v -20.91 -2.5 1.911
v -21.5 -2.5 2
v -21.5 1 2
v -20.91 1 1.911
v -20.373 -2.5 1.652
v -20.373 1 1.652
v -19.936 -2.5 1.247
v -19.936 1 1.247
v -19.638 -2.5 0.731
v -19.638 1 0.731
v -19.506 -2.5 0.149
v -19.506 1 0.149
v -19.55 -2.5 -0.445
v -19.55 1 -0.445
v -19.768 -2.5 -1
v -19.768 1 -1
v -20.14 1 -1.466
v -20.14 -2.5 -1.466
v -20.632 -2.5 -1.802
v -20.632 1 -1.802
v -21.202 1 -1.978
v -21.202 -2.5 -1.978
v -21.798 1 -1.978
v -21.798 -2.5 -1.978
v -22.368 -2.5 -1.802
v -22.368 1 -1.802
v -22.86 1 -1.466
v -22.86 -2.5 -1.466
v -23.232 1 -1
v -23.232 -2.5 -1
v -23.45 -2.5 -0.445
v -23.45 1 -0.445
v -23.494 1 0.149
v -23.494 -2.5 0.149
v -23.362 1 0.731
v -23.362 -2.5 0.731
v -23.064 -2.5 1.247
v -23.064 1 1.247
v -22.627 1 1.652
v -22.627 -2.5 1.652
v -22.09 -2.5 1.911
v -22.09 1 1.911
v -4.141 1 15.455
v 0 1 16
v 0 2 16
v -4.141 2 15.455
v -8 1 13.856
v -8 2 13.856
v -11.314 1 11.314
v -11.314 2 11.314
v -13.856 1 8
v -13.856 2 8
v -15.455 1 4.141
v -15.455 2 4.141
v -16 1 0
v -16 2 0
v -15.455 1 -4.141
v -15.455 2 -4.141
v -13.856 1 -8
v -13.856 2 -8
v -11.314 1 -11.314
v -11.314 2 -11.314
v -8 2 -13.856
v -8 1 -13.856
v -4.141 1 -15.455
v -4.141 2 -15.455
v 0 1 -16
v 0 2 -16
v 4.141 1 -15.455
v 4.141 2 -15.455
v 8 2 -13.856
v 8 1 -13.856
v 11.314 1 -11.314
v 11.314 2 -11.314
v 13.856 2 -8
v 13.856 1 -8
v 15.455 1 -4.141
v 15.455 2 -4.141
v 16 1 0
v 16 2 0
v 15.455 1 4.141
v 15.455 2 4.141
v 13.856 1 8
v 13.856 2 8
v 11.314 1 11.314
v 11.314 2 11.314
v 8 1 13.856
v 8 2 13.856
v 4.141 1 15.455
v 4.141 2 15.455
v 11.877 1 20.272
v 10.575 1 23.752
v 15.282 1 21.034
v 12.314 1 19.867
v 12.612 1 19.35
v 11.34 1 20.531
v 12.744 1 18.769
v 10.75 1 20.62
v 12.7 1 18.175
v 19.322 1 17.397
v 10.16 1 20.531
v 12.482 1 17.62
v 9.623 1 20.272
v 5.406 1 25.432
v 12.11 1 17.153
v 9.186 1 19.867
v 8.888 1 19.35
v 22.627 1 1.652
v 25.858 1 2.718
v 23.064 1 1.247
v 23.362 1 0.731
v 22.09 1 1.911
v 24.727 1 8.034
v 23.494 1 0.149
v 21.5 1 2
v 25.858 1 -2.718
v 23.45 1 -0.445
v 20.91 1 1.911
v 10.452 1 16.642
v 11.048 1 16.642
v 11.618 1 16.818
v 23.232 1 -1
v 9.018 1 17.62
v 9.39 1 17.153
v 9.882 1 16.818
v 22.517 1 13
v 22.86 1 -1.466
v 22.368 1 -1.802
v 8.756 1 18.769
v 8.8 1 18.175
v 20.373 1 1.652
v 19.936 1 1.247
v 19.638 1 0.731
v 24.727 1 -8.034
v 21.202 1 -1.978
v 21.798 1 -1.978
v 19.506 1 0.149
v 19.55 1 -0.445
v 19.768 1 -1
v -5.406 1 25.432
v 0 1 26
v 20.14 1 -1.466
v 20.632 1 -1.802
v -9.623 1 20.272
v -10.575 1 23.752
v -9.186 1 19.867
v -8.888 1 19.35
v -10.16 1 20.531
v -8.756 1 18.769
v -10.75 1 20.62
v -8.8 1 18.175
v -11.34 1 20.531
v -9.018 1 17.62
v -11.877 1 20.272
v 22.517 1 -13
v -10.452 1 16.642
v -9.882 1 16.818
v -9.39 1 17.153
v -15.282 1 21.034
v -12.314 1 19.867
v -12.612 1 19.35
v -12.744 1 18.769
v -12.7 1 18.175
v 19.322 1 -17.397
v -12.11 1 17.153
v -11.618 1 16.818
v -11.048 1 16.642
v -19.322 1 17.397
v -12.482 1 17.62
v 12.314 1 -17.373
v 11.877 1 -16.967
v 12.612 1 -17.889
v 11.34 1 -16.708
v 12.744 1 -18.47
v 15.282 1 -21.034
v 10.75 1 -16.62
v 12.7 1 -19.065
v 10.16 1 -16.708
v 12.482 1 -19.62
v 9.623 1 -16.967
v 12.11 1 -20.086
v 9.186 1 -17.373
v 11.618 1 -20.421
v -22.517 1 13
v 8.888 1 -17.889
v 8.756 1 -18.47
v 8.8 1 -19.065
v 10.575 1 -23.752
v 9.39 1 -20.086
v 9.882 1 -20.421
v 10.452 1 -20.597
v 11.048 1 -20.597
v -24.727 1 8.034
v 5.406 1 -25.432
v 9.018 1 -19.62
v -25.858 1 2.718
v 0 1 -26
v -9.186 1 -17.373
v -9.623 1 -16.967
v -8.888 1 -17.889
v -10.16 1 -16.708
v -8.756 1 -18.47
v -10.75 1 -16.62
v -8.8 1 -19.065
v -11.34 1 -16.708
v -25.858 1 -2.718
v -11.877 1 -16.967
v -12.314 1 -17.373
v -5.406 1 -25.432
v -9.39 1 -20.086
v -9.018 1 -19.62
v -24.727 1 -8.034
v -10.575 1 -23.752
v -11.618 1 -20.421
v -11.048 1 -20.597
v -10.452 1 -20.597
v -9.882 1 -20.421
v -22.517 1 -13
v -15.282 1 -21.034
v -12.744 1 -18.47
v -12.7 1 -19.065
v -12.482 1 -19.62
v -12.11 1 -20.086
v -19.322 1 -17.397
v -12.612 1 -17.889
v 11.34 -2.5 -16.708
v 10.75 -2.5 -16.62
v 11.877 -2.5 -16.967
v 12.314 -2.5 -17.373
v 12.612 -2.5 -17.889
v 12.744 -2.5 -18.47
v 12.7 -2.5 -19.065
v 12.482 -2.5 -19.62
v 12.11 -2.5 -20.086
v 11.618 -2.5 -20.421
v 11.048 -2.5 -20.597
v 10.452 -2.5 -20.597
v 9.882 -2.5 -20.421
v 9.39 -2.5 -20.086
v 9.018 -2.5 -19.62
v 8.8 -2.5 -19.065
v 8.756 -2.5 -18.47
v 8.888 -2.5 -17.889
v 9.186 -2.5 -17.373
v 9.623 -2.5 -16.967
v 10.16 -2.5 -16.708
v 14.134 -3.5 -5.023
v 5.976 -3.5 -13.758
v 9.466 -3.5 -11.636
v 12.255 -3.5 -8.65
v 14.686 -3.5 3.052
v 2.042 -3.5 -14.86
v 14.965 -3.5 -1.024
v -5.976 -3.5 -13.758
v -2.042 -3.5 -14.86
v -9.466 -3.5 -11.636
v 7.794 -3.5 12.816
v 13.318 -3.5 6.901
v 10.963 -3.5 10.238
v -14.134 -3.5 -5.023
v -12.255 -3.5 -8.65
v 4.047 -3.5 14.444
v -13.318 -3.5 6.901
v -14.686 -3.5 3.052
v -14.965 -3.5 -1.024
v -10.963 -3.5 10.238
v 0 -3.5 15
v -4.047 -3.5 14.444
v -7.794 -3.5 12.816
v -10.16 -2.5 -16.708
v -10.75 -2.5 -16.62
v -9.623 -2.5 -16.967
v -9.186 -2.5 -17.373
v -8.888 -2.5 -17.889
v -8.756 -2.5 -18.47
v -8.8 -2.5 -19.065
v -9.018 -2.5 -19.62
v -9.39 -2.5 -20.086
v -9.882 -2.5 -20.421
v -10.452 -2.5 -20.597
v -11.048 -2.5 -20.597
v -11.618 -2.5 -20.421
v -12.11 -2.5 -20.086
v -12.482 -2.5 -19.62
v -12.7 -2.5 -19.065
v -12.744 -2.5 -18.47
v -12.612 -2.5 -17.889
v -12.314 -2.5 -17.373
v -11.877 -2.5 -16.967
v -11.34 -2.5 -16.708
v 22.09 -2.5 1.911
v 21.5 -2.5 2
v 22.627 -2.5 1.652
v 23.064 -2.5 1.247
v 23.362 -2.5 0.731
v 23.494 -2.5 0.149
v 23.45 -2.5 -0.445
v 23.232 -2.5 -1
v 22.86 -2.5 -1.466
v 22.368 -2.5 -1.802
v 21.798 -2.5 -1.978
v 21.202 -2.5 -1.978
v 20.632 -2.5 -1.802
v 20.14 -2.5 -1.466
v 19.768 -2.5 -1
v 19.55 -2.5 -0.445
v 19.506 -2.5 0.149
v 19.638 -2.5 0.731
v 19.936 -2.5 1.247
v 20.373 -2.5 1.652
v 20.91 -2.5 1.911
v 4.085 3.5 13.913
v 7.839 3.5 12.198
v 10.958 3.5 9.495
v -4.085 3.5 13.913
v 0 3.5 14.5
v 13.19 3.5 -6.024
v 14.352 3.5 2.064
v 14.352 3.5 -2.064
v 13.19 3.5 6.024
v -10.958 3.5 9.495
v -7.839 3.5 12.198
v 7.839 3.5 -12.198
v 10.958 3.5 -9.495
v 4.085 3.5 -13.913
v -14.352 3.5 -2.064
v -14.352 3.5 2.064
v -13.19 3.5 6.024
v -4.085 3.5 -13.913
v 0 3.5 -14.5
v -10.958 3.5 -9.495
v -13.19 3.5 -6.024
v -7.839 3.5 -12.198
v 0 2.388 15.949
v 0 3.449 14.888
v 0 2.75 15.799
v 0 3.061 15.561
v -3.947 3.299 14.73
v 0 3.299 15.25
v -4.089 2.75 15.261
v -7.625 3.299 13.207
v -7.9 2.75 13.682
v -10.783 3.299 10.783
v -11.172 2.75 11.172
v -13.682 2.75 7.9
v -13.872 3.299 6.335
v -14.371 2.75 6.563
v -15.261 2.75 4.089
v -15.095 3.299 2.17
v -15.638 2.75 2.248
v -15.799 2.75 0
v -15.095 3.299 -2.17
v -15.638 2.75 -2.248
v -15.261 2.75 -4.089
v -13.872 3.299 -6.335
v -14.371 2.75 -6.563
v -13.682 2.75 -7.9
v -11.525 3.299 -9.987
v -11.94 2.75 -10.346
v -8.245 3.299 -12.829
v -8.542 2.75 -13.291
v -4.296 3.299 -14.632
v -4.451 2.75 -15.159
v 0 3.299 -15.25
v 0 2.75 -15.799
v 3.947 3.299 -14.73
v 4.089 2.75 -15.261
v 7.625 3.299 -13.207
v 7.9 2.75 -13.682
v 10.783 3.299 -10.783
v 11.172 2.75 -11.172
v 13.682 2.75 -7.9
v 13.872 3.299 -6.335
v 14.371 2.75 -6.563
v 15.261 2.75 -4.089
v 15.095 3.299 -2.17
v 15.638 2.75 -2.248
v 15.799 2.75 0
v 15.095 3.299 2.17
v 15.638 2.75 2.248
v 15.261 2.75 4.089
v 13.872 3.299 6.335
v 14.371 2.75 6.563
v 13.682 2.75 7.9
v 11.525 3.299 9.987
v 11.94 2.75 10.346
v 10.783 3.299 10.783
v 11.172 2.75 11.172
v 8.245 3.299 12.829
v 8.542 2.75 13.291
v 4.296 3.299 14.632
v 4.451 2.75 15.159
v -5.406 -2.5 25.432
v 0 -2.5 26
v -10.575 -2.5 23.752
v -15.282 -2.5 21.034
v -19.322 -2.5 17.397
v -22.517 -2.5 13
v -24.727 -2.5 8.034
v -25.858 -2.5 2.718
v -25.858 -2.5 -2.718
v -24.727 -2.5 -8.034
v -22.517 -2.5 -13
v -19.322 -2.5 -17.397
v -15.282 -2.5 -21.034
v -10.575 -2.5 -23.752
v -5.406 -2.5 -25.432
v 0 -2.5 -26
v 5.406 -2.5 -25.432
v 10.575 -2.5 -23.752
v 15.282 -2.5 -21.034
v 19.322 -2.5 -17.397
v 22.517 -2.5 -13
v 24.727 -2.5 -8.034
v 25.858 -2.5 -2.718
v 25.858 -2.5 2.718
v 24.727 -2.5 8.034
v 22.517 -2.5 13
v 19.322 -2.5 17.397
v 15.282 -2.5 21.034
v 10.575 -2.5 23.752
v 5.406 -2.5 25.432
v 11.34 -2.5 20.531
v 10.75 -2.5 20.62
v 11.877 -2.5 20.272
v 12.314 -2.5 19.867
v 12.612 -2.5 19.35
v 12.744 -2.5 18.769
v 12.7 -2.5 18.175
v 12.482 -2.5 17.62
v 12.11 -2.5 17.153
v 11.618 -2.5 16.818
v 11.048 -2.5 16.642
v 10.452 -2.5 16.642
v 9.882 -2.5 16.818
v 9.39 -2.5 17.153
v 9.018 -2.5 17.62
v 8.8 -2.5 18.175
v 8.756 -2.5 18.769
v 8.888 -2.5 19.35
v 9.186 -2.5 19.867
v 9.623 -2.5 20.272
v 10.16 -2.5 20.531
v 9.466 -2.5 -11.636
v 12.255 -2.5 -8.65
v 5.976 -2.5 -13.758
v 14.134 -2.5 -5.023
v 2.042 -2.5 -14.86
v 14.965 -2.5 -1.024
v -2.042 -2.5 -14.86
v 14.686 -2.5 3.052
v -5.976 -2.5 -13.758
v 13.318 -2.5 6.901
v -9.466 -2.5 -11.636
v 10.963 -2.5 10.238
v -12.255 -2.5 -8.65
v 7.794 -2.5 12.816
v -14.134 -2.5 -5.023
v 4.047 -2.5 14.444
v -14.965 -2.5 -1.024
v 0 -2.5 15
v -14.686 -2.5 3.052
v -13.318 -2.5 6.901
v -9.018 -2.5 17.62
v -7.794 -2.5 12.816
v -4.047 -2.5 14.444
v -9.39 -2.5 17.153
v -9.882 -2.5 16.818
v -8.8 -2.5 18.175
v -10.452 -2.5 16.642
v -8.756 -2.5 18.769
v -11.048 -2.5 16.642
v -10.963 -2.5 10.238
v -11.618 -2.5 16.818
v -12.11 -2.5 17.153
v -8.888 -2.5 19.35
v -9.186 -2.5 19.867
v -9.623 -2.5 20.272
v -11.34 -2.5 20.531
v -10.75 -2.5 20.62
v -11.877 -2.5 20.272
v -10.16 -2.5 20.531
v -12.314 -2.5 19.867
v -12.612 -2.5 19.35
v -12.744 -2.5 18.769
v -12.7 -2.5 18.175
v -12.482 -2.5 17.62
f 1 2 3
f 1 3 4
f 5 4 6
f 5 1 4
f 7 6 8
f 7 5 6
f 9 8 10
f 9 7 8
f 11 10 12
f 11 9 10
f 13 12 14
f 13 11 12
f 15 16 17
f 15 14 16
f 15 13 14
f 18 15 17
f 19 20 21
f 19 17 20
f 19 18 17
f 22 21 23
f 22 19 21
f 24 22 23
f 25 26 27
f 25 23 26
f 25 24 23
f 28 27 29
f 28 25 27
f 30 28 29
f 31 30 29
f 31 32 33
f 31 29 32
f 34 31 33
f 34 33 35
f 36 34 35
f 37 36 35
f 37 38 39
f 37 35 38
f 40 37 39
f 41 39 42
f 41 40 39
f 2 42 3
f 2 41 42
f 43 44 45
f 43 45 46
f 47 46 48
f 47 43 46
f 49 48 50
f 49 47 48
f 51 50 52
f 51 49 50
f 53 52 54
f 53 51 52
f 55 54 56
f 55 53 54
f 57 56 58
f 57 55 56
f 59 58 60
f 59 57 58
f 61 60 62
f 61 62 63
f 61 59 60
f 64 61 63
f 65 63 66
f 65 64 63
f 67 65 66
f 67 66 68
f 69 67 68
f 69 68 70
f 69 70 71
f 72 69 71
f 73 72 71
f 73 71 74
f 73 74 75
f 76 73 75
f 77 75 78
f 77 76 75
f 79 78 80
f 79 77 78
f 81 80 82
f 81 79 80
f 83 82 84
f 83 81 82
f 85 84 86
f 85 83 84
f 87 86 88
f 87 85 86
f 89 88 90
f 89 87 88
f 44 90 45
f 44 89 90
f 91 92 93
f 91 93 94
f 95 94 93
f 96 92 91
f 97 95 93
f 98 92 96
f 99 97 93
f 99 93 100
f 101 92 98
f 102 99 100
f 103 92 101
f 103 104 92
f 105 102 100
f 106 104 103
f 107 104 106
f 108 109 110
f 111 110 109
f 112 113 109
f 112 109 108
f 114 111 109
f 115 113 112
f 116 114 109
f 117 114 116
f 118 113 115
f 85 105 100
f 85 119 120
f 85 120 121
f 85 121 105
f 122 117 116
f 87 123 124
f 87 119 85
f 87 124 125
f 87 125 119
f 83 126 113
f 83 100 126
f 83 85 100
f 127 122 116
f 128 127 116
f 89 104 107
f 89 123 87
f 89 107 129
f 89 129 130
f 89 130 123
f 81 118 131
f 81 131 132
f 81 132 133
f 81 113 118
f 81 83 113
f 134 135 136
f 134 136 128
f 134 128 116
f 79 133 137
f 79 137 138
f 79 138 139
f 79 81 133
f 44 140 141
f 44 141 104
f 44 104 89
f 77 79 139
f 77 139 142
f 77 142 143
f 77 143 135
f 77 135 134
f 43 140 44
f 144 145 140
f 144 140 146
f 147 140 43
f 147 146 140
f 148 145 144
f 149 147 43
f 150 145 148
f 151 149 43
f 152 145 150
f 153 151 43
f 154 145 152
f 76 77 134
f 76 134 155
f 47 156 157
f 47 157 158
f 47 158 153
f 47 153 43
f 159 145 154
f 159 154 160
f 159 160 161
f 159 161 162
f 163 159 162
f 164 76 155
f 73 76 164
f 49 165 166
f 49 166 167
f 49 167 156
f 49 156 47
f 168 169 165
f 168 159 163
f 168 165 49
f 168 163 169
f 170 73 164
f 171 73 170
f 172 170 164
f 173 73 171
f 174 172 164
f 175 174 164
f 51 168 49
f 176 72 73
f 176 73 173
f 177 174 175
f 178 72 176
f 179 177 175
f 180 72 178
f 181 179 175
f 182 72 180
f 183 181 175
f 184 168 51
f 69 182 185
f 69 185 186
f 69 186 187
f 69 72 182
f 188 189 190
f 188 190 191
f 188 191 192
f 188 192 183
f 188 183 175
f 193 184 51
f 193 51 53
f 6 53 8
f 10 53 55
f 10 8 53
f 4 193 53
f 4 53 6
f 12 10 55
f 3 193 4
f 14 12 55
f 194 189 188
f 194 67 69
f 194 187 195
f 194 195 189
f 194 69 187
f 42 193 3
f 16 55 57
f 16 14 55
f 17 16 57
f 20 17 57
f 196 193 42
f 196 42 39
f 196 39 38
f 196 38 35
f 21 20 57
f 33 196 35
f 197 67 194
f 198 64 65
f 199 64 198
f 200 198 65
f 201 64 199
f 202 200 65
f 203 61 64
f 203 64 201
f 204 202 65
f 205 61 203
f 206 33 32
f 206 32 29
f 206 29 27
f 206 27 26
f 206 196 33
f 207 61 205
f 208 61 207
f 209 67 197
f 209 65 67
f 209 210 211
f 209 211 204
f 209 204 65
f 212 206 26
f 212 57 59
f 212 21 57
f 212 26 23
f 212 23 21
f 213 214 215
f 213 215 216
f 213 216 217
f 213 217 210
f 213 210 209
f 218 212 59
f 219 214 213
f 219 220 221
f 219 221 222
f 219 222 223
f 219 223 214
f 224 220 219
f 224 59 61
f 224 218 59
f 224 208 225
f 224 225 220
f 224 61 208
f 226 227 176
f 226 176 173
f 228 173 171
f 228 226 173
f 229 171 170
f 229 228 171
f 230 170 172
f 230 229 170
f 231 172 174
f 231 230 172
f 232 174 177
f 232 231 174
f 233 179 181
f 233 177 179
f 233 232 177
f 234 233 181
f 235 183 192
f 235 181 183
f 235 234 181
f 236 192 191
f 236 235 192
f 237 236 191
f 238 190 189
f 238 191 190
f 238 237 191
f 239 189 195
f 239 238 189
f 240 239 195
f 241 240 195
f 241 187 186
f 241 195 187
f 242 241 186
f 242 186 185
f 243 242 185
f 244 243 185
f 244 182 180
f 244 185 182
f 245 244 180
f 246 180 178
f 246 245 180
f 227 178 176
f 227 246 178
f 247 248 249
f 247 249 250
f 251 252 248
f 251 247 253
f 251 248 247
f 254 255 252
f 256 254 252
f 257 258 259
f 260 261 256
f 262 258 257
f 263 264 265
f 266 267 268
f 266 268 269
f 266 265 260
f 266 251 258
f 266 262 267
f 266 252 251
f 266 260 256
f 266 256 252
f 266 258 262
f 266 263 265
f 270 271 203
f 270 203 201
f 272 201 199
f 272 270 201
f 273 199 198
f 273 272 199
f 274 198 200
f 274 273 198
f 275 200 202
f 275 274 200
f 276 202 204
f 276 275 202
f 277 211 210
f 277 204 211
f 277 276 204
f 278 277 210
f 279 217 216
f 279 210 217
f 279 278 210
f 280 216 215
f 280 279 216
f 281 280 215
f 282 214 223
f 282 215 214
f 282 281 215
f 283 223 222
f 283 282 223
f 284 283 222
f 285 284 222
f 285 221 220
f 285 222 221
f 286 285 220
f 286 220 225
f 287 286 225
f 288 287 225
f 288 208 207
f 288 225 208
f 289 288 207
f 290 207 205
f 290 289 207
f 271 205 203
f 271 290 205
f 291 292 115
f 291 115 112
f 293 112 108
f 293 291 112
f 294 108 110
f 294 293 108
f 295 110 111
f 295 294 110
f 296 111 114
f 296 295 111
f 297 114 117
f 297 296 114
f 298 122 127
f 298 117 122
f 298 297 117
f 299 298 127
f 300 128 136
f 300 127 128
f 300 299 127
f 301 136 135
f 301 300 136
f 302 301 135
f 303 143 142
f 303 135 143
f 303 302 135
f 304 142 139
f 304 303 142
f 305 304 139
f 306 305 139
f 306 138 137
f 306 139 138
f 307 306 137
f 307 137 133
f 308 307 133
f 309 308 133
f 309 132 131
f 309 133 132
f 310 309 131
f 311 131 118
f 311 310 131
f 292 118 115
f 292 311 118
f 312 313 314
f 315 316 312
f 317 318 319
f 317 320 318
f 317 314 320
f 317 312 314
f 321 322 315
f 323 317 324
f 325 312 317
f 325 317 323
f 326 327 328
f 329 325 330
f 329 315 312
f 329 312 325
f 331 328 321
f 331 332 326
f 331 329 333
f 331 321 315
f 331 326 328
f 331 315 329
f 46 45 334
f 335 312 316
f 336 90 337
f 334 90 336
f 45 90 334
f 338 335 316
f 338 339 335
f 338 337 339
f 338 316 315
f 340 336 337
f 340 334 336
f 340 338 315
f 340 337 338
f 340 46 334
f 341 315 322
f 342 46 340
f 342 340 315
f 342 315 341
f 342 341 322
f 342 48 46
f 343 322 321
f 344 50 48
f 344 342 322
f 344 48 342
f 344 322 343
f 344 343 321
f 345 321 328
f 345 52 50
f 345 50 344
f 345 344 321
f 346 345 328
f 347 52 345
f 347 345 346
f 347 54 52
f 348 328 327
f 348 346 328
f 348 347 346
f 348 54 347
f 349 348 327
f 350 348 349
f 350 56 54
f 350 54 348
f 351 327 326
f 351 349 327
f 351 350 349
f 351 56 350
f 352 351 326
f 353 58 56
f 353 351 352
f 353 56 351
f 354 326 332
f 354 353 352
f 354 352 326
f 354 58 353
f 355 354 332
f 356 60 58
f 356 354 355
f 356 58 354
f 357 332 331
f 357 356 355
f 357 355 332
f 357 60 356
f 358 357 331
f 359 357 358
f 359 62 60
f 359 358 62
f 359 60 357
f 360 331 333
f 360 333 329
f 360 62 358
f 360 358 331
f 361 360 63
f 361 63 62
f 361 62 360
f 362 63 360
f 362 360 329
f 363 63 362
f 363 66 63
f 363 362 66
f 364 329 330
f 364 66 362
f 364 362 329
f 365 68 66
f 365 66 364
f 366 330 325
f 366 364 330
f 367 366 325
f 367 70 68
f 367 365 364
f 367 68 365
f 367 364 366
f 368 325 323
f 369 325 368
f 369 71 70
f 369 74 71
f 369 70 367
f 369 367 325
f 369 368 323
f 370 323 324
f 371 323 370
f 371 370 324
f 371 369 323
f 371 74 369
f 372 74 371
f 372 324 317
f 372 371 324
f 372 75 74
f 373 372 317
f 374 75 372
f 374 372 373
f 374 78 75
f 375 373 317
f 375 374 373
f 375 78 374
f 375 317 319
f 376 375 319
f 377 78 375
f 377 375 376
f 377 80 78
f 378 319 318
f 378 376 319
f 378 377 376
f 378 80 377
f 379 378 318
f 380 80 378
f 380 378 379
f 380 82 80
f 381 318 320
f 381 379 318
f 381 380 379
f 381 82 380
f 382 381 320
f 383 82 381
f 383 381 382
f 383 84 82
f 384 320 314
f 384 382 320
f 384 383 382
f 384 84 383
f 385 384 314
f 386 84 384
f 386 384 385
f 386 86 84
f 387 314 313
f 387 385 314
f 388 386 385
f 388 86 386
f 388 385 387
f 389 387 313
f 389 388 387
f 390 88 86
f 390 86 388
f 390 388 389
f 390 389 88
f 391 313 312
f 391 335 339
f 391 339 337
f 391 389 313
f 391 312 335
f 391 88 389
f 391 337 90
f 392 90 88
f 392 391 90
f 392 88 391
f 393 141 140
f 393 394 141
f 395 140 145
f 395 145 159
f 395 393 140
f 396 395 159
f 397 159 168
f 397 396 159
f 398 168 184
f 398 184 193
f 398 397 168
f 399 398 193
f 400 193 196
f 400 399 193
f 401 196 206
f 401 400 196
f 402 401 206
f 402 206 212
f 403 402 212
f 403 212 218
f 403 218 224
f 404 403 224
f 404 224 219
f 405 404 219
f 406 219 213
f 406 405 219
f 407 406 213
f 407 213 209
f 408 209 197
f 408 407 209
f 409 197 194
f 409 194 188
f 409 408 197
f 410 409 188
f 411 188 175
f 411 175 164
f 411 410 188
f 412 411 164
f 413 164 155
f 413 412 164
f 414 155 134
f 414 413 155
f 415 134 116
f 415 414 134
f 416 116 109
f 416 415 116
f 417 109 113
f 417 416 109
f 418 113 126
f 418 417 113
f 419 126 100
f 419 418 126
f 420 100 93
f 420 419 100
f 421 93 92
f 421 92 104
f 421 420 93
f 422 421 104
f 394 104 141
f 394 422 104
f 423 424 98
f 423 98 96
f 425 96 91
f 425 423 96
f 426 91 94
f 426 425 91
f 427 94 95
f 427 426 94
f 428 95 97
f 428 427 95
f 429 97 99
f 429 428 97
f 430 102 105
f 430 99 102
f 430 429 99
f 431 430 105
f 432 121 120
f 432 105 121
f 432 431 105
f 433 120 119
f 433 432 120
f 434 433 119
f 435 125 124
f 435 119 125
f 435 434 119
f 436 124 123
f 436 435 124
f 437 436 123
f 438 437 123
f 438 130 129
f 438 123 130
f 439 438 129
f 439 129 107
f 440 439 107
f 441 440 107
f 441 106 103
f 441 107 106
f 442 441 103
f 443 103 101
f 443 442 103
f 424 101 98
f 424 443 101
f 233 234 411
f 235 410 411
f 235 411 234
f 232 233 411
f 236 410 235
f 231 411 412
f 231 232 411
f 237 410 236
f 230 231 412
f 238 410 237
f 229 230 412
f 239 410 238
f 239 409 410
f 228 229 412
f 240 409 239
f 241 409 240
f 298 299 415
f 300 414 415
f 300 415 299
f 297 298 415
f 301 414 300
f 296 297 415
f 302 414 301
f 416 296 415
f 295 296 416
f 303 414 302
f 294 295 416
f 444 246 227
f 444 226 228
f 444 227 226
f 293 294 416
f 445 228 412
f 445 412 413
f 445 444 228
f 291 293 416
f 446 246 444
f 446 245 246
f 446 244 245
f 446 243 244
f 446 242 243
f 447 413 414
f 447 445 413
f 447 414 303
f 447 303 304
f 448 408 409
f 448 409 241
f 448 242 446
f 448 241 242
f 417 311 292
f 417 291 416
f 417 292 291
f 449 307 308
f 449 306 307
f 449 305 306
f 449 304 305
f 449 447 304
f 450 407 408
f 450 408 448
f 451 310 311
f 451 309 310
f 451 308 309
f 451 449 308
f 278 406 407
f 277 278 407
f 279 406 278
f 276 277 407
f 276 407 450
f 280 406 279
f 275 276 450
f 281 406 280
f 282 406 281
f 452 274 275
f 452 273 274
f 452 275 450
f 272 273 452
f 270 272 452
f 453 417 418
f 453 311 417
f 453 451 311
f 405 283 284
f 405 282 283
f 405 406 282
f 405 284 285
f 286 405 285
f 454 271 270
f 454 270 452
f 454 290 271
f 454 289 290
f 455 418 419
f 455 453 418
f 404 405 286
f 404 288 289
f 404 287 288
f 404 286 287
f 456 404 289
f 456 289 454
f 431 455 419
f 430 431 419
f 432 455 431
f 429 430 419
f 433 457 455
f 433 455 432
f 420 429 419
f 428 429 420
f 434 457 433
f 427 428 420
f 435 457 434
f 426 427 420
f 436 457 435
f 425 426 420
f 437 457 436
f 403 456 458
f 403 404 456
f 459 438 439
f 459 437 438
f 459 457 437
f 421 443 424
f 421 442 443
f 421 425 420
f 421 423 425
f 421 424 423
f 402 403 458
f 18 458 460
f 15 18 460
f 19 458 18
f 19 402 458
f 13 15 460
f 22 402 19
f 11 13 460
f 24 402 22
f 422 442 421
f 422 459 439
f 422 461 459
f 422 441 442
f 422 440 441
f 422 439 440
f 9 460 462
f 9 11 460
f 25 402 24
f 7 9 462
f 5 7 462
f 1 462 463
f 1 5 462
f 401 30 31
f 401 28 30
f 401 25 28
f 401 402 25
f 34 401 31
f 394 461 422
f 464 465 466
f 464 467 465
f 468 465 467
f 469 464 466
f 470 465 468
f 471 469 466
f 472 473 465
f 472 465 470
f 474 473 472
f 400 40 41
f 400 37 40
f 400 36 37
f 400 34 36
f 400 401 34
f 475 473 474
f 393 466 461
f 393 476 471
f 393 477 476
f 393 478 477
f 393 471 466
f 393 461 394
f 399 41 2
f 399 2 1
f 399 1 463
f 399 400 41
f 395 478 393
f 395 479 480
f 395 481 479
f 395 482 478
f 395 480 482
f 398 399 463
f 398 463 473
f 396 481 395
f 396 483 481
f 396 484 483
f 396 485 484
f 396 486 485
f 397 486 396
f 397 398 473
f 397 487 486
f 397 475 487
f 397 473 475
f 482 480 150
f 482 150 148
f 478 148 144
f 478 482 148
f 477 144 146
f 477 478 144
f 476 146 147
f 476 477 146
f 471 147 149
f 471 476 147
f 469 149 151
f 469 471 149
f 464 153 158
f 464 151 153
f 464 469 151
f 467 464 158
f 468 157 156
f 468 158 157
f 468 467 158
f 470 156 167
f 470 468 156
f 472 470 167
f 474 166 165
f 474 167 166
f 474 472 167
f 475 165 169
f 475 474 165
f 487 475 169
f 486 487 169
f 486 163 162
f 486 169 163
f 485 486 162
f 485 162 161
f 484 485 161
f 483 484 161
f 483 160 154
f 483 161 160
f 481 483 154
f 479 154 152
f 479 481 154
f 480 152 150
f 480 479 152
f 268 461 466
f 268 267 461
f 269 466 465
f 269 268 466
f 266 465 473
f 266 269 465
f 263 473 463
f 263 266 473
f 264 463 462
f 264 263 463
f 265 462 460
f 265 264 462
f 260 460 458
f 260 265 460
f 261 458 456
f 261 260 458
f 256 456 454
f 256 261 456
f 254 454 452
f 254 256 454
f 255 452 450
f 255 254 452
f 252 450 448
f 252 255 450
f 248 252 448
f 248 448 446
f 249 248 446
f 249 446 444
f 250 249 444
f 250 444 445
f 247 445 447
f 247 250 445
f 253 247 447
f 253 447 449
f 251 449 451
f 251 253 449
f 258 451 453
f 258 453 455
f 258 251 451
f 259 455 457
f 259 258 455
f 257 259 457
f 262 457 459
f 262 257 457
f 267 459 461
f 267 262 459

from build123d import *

# Parameters (mm, degrees)
CUT_EXTRUDE1_DEPTH      = 37.935755035
CUT_EXTRUDE1_DEPTH_BACK = 37.935755035
SKETCH2_R               = 2
FILLET1_R               = 1.5


with BuildPart() as part:
    # Sketch1 → Revolve1 (revolve)
    with BuildSketch(Plane.XY, mode=Mode.PRIVATE) as revolve1_sk:
        Polygon((0, 3.5), (16, 3.5), (16, 1), (26, 1), (26, -2.5), (15, -2.5), (15, -3.5), (0, -3.5), align=None)
    revolve(revolve1_sk.sketch.rotate(Axis((0, 3.5, 0), (0, -1, 0)), 90), axis=Axis((0, 3.5, 0), (0, -1, 0)))

    # Sketch2 → Cut-Extrude1 (cut, two sides: drawn at the far end of the back side and taken through both)
    with BuildSketch(Plane(origin=(0, 0, 0), x_dir=(1, 0, 0), z_dir=(0, 1, 0)).offset(-CUT_EXTRUDE1_DEPTH_BACK)):
        with Locations(Location((-21.5, 0, 0), (0, 0, 270))):
            Circle(SKETCH2_R)
        with Locations(Location((-10.75, -18.619546181, 0), (0, 0, 270))):
            Circle(SKETCH2_R)
        with Locations(Location((10.75, -18.619546181, 0), (0, 0, 270))):
            Circle(SKETCH2_R)
        with Locations(Location((21.5, 0, 0), (0, 0, 270))):
            Circle(SKETCH2_R)
        with Locations(Location((10.75, 18.619546181, 0), (0, 0, 270))):
            Circle(SKETCH2_R)
        with Locations(Location((-10.75, 18.619546181, 0), (0, 0, 270))):
            Circle(SKETCH2_R)
    extrude(amount=CUT_EXTRUDE1_DEPTH + CUT_EXTRUDE1_DEPTH_BACK, mode=Mode.SUBTRACT)

    # Fillet1
    fillet1_edges = [part.edges().sort_by_distance(p)[0] for p in [
        (0, 3.5, -16),
    ]]
    fillet(fillet1_edges, radius=FILLET1_R)


solid = part.part
